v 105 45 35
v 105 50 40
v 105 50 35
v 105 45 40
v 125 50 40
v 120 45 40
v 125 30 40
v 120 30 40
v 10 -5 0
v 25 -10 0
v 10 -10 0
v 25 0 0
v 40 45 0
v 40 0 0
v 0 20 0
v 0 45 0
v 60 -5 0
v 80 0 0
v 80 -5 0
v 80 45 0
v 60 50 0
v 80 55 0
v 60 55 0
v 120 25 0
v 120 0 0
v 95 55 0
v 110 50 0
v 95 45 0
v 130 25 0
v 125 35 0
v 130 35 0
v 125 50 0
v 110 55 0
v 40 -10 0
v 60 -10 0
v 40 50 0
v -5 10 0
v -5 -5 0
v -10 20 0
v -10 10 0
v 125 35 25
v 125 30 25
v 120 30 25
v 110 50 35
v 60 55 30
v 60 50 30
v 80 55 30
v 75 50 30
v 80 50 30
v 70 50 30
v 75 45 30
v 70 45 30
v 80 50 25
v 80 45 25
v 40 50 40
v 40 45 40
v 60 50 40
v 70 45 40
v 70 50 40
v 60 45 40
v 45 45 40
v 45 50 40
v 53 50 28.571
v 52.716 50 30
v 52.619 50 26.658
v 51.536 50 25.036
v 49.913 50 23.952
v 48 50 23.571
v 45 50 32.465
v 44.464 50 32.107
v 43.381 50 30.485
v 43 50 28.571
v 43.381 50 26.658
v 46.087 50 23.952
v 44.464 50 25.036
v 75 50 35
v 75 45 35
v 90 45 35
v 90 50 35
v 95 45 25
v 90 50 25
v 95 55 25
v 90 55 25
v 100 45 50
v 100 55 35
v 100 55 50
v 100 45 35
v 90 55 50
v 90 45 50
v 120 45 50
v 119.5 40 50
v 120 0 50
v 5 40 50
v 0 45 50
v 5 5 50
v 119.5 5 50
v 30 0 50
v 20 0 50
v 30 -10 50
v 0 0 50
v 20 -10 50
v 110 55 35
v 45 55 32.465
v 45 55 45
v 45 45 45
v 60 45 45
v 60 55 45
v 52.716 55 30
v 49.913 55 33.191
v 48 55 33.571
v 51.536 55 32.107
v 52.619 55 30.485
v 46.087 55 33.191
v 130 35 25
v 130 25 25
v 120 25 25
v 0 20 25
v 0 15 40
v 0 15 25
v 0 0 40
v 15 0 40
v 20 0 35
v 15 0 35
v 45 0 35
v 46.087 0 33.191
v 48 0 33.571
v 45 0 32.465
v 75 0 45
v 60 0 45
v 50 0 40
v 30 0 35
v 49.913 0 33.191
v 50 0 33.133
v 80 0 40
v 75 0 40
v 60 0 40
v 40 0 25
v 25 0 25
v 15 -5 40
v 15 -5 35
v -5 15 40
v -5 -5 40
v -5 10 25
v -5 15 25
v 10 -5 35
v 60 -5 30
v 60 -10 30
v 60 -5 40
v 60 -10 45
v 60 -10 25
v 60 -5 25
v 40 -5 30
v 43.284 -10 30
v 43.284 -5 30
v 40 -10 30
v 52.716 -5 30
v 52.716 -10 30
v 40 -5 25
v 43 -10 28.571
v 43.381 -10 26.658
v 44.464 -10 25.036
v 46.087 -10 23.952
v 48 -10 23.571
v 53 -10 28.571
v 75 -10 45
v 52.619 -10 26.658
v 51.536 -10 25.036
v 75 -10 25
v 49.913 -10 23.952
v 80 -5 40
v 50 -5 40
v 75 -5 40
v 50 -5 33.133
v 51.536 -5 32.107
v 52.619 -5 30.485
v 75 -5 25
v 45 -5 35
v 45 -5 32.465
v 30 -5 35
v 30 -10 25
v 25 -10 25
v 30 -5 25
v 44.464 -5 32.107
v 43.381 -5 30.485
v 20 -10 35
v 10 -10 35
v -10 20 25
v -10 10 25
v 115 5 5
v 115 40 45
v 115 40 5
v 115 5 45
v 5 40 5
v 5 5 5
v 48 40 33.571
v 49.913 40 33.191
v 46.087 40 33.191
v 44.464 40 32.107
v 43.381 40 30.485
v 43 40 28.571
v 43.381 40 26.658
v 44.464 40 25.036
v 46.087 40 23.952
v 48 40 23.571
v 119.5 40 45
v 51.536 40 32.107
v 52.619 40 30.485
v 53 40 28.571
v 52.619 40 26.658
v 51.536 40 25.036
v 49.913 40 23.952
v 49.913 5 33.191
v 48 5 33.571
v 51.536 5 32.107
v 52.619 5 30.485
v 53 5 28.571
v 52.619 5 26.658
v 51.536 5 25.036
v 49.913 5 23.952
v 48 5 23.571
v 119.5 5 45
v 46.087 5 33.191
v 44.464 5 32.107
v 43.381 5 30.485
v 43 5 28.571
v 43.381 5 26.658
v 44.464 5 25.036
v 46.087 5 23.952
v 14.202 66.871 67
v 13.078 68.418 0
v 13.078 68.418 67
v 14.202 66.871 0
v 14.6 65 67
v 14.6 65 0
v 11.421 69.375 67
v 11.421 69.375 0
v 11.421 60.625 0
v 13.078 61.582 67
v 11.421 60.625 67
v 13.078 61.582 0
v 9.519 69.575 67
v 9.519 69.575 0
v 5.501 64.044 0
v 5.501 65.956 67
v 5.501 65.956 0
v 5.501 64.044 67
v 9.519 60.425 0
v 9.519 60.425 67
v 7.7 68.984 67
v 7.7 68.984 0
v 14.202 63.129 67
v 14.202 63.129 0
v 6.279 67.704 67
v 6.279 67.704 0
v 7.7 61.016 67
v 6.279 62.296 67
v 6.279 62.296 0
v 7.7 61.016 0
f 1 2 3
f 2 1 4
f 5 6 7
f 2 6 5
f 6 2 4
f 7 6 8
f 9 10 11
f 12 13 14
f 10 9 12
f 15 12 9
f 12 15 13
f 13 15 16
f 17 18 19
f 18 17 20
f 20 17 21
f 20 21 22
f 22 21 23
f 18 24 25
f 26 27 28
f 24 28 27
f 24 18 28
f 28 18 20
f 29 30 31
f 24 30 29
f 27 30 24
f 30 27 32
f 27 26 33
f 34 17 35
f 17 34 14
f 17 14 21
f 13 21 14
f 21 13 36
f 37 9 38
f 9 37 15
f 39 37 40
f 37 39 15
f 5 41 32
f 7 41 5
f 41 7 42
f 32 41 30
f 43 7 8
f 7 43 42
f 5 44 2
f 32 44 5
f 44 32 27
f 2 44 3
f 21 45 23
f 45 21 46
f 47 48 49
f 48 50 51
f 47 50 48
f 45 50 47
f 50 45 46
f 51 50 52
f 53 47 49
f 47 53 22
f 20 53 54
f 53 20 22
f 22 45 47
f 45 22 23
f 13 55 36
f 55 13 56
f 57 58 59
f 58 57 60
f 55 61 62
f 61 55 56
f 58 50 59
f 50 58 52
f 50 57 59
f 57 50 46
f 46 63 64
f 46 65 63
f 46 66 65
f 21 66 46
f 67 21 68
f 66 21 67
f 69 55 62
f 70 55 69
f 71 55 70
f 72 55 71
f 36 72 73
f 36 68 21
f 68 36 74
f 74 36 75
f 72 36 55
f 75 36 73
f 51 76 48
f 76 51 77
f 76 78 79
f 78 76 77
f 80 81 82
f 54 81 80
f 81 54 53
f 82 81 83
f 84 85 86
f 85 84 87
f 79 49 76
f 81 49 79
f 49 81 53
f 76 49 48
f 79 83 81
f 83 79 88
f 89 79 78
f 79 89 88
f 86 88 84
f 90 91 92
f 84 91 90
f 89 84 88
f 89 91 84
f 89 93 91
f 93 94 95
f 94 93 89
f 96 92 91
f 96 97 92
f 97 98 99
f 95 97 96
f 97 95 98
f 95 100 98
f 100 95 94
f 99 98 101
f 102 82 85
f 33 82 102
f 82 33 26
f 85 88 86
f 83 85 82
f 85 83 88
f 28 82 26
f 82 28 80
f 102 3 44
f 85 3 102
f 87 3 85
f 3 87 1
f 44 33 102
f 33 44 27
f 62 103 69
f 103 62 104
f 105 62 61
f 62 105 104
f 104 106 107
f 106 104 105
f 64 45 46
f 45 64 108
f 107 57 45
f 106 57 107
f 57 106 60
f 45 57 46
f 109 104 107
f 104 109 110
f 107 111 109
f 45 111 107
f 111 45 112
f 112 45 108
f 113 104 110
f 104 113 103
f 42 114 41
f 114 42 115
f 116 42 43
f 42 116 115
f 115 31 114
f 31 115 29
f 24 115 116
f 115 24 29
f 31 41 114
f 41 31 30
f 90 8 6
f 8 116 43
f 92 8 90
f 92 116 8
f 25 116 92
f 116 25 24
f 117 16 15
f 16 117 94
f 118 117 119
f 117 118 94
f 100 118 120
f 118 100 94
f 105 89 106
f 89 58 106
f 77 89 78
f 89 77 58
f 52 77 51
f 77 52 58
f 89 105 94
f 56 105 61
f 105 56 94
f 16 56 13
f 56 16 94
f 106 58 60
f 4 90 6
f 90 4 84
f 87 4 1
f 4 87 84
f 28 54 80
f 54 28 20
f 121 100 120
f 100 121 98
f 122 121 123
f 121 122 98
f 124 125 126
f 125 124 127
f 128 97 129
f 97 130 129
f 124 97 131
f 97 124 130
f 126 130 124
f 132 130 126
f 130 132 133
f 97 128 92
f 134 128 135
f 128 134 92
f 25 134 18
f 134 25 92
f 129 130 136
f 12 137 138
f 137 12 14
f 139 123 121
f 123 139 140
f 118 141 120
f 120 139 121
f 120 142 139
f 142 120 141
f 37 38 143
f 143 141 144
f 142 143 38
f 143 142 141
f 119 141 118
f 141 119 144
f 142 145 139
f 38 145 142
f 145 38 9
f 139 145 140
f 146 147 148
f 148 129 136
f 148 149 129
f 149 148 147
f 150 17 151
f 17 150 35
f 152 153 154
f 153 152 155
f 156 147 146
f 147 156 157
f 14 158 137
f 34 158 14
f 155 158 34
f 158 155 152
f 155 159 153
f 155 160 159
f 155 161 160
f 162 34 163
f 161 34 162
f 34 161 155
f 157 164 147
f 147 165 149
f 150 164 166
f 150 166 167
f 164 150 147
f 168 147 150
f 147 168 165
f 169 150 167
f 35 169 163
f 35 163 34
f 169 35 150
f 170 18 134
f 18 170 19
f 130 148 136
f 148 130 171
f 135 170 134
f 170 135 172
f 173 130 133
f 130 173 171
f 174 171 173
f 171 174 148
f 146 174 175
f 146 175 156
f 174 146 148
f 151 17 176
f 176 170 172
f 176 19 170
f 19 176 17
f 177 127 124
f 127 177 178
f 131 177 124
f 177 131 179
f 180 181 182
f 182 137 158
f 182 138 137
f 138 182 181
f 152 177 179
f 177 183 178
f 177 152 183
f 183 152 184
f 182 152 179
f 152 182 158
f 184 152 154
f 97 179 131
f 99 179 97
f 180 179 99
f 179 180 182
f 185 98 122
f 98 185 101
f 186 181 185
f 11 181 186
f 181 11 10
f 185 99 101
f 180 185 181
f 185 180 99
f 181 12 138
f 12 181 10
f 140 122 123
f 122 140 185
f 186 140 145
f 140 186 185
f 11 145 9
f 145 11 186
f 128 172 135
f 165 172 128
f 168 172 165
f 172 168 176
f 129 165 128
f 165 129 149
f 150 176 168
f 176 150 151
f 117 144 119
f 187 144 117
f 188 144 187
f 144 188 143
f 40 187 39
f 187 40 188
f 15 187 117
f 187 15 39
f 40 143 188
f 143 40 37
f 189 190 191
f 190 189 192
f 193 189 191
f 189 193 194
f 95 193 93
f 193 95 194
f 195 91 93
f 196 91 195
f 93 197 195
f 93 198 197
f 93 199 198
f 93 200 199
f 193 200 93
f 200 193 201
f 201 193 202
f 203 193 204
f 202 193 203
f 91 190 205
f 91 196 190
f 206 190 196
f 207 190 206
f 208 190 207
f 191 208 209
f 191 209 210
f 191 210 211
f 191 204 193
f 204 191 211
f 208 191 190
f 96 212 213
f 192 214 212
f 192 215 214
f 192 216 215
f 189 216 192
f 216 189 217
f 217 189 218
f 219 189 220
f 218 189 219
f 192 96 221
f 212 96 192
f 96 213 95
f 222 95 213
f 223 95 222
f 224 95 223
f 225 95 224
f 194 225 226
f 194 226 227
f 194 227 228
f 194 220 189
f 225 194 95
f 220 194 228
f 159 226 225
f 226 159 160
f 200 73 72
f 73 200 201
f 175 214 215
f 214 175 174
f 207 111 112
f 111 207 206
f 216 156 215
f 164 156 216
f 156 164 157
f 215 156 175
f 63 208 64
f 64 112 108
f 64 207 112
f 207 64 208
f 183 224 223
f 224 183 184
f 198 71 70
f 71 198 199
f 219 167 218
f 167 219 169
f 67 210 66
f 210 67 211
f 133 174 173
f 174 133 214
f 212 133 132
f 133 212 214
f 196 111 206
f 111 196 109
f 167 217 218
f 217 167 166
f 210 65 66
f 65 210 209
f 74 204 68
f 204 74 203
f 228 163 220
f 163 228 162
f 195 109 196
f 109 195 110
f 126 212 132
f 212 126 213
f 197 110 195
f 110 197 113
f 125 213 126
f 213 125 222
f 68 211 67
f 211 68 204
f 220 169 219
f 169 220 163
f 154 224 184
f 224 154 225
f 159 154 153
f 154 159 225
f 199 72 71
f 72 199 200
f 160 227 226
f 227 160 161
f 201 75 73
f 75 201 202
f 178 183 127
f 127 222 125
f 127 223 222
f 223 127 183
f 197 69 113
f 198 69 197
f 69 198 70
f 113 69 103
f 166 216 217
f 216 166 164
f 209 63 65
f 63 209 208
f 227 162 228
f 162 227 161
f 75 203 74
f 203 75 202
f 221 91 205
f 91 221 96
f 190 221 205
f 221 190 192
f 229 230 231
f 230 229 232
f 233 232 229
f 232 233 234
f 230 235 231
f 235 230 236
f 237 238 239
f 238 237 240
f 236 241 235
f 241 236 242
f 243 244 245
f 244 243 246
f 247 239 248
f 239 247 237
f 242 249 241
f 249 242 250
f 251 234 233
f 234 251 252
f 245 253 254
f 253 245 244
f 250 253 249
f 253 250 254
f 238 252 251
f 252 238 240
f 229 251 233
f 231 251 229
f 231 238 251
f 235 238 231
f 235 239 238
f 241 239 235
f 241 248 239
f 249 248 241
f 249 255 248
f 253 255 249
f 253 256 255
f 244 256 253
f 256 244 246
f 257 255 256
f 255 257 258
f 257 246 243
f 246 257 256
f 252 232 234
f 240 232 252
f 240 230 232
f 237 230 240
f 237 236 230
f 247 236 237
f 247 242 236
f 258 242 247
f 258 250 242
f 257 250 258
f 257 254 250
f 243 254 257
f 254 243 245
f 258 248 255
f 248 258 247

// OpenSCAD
//Customizable Tape Dispenser

//Main Box Width
BaseWidth = 45;

//Main Box Length
BaseLength = 120;

//Main Box Height
BaseHeight = 50;

//Outside Large Box (How far it goes out)
OutsideLLength = 10;

//Outside Small Box (How far it goes out)
OutsideSLength = 5;

BottomThickness = 5;

//Main Hole Width
MHoleWidth = 35;

//Main Hole Length
MHoleLength = 110;

//Radius of Pole
RPole = 5;


difference(){
    //Base Cube
    union(){
        cube([BaseLength,BaseWidth,BaseHeight]);
        translate([-BaseLength/24,-OutsideSLength,0]){
            cube([20,20,40]);
        }
        translate([BaseLength/3,-OutsideLLength,0]){
            cube([20,20,30]);
        }
        translate([5*BaseLength/12,-OutsideSLength,0]){
            cube([30,20,40]);
        }
        translate([BaseLength/6,-OutsideSLength,BaseHeight/2]){
            cube([25,20,10]);
        }
        translate([BaseLength/6,-OutsideLLength,BaseHeight/2]){
            cube([10,20,25]);
        }
        translate([BaseLength/12,-OutsideLLength,0]){
            cube([15,20,35]);
        }
        translate([BaseLength/2,-OutsideLLength,BaseHeight/2]){
            cube([15,20,20]);
        }
        translate([-OutsideLLength,2*BaseWidth/9,0]){
            cube([15,10,25]);
        }
        rotate([0,0,180]){
            translate([-BaseLength,-BaseWidth, 0]){
                translate([-BaseLength/24,-OutsideSLength,0]){
                    cube([20,20,40]);
                }
                translate([BaseLength/3,-OutsideLLength,0]){
                    cube([20,20,30]);
                }
                translate([5*BaseLength/12,-OutsideSLength,0]){
                    cube([30,20,40]);
                }
                translate([BaseLength/6,-OutsideSLength,25]){
                    cube([25,20,10]);
                }
                translate([BaseLength/6,-OutsideLLength,25]){
                    cube([10,20,25]);
                }
                translate([BaseLength/12,-OutsideLLength,0]){
                    cube([15,20,35]);
                }
                translate([BaseLength/2,-OutsideLLength,30]){
                    cube([15,20,15]);
                }
                translate([-OutsideLLength,2*BaseWidth/9,0]){
                    cube([15,10,25]);
                }
            }
        }
    }
    //Main Hole
    translate([(BaseLength-MHoleLength)/2, (BaseWidth-MHoleWidth)/2,BottomThickness]){
        cube([MHoleLength,MHoleWidth,BaseHeight]);
    }
    //Pole
    translate([BaseLength/2.5, BaseWidth+OutsideLLength+100,BaseHeight/1.75]){
        rotate([90,0,0]){
        cylinder(BaseWidth+(OutsideLLength*2)+200,RPole,RPole);
        }
    }
    //Cutter
    translate([(BaseLength-MHoleLength)-0.5, (BaseWidth-MHoleWidth)/2,BaseHeight-5]){
        cube([MHoleLength,MHoleWidth,BaseHeight]);
    }
}
//Pole
translate([10, BaseWidth+OutsideLLength+10,0]){
    cylinder(BaseWidth+(OutsideLLength*2)+2,RPole-0.4,RPole-0.4);
}
